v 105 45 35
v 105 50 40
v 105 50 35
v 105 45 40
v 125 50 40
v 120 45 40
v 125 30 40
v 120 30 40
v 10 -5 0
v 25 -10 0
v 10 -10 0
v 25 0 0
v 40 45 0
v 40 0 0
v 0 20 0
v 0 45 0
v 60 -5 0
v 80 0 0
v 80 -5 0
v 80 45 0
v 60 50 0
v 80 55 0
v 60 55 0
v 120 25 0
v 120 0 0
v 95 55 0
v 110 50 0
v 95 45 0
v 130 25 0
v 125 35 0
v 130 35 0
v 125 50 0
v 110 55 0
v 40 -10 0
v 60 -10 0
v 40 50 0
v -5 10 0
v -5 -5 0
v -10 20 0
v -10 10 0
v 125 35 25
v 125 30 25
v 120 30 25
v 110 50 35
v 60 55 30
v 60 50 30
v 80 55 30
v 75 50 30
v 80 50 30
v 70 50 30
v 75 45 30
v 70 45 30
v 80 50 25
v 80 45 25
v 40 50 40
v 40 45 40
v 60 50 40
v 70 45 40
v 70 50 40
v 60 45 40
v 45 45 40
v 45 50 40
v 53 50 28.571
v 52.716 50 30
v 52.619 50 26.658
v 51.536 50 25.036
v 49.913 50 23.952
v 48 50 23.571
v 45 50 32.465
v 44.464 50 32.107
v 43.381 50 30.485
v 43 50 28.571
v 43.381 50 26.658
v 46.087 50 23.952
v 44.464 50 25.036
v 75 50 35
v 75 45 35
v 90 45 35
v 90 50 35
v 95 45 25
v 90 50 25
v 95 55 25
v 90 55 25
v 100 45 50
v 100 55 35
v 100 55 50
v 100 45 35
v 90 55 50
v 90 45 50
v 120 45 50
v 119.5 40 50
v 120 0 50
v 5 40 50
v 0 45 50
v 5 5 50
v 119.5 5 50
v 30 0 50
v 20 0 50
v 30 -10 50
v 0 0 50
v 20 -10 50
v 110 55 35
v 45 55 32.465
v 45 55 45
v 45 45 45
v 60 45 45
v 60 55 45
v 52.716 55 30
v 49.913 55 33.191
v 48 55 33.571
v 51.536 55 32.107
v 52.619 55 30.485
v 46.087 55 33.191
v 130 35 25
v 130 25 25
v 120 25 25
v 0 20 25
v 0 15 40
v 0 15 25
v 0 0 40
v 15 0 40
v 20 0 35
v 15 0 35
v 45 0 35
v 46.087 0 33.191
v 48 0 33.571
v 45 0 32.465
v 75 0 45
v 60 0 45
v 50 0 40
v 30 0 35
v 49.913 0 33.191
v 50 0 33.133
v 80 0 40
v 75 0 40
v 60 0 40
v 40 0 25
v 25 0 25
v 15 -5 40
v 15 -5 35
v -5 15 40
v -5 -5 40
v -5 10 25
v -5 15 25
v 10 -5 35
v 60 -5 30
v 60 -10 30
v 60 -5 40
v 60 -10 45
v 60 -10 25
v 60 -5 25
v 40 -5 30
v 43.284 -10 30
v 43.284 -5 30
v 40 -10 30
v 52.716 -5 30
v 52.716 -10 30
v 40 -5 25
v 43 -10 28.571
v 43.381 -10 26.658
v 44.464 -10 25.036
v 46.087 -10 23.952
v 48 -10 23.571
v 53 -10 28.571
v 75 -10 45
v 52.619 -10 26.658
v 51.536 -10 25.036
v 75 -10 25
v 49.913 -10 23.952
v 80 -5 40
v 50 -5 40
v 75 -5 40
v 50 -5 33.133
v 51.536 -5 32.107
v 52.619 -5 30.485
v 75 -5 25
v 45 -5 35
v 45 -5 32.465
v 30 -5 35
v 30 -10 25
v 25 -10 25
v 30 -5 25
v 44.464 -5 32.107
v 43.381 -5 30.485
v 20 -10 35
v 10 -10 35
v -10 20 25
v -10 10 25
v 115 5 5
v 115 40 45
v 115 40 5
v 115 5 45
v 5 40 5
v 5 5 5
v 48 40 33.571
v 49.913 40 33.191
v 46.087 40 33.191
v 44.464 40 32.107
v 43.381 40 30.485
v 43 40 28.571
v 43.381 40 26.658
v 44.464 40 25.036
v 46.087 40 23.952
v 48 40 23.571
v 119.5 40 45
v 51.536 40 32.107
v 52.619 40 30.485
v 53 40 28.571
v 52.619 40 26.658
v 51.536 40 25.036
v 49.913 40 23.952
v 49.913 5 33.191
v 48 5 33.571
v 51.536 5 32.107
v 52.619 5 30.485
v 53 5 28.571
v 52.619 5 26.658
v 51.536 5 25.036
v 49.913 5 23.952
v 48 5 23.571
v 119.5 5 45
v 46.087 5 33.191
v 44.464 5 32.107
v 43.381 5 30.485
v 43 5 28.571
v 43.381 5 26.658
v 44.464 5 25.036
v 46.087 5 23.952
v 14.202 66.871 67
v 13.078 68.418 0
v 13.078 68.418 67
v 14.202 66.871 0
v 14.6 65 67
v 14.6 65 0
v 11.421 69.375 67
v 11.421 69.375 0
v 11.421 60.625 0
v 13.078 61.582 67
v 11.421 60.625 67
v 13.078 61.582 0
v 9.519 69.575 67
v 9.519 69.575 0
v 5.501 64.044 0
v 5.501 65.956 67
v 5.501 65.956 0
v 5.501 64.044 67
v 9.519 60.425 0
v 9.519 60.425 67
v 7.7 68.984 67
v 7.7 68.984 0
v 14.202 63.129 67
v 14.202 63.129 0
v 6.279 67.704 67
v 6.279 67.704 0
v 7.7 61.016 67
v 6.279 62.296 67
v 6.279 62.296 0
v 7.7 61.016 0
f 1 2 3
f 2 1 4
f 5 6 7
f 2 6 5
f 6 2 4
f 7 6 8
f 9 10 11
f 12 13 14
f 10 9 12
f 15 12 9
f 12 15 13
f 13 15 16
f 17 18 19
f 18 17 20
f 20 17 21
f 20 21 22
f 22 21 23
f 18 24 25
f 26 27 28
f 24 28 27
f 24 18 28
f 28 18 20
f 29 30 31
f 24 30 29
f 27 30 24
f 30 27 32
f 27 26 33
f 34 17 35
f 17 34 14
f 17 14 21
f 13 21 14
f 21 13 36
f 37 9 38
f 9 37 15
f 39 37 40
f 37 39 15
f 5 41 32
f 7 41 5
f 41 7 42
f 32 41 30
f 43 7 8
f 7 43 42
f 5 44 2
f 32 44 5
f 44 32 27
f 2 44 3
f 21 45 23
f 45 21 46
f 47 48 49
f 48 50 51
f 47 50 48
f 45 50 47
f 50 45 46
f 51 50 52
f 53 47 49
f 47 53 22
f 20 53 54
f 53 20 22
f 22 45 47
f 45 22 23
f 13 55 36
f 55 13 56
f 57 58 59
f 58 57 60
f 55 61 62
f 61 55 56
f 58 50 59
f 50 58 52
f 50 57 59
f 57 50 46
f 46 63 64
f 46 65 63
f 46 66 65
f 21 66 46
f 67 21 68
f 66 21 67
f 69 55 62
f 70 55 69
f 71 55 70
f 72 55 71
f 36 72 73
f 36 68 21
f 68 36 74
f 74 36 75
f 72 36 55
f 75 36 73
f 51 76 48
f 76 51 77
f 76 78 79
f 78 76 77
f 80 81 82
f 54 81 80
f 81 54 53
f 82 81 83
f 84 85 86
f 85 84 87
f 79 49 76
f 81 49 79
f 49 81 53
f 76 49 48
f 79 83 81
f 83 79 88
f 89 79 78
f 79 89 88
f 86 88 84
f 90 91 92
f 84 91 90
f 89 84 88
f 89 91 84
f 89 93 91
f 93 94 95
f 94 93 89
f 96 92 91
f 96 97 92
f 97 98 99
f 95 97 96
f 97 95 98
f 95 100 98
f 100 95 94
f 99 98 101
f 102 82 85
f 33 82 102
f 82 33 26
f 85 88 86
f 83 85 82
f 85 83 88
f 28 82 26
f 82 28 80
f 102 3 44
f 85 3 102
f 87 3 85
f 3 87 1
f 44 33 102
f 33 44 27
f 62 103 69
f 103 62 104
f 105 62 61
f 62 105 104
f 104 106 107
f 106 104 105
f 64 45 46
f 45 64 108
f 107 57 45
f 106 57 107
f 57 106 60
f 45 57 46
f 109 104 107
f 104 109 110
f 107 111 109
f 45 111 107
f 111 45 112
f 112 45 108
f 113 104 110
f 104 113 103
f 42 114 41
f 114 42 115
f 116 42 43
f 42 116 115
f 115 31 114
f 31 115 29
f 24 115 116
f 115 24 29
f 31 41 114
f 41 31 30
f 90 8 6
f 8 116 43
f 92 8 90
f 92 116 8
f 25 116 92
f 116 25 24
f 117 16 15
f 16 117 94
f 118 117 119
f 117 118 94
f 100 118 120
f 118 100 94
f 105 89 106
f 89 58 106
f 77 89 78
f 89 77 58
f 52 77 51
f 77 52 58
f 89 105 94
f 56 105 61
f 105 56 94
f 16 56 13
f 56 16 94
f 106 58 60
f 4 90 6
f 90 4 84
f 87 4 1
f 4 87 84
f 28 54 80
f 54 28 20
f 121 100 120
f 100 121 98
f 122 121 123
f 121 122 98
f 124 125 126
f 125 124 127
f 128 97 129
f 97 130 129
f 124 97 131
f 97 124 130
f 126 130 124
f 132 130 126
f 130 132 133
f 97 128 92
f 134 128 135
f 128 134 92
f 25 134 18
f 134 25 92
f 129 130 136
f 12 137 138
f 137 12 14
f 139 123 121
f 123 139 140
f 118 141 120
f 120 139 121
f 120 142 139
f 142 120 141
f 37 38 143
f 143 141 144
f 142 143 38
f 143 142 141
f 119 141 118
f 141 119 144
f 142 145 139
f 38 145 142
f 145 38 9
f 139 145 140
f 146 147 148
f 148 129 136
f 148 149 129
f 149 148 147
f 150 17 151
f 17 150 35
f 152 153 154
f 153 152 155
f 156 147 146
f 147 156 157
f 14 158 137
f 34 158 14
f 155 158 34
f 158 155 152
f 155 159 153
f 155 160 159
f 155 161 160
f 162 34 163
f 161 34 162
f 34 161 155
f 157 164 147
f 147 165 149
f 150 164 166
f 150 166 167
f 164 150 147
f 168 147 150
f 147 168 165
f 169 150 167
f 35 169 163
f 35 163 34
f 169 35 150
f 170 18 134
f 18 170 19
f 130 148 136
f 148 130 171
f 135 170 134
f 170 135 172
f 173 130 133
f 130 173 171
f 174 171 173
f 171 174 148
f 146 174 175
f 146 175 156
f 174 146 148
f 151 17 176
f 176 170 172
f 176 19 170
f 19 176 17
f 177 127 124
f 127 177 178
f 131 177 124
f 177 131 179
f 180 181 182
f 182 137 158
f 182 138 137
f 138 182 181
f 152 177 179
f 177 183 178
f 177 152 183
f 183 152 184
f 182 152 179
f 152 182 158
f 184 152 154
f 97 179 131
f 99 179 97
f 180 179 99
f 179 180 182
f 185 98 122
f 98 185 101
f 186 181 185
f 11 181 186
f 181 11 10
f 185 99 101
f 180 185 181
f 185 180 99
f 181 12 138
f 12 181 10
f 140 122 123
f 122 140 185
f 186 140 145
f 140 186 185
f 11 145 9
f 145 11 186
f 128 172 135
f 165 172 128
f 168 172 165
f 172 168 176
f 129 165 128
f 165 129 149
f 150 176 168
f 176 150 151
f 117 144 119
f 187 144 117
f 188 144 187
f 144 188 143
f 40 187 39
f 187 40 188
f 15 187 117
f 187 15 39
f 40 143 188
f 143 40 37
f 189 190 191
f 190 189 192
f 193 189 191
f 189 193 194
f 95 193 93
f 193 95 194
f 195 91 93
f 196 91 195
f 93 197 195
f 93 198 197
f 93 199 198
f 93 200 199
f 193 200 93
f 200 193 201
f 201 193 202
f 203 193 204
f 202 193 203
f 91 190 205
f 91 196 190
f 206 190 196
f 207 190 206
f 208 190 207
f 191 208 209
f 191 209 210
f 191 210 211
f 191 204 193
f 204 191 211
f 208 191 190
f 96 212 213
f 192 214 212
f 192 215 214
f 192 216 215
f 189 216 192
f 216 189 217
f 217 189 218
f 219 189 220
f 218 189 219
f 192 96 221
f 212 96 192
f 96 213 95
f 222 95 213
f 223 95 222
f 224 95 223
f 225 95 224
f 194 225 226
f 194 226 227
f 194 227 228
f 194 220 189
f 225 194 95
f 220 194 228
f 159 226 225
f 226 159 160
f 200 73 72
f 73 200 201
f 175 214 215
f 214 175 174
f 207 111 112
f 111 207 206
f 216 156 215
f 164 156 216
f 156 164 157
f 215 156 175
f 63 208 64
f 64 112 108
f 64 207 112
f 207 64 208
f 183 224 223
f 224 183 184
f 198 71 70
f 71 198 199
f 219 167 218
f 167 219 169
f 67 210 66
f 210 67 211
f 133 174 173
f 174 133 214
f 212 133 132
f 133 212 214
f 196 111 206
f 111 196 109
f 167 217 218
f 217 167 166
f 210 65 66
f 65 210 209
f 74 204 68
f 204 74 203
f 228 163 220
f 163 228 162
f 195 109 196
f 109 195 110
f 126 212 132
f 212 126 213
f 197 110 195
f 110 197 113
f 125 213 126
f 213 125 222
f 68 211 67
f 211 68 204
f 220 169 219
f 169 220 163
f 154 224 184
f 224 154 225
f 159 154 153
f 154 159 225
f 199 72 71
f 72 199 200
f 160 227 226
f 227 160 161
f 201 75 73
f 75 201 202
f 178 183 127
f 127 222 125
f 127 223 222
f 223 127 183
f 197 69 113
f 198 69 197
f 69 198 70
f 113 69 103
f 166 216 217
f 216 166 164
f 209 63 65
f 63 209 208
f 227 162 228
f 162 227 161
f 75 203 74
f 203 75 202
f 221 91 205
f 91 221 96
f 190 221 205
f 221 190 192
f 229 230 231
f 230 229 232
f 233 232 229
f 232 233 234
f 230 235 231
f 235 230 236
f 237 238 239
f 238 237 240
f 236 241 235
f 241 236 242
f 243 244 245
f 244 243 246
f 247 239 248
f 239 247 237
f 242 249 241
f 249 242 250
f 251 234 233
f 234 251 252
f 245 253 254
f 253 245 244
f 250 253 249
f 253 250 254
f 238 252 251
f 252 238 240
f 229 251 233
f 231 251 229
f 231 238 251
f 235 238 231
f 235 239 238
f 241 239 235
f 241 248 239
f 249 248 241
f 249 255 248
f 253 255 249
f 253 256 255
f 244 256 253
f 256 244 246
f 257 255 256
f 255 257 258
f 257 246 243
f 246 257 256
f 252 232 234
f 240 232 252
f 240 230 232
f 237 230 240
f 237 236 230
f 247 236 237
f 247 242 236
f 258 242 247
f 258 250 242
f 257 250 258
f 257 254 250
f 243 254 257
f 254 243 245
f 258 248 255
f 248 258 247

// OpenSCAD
//Customizable Tape Dispenser

//Main Box Width
BaseWidth = 45;

//Main Box Length
BaseLength = 120;

//Main Box Height
BaseHeight = 50;

//Outside Large Box (How far it goes out)
OutsideLLength = 10;

//Outside Small Box (How far it goes out)
OutsideSLength = 5;

BottomThickness = 5;

//Main Hole Width
MHoleWidth = 35;

//Main Hole Length
MHoleLength = 110;

//Radius of Pole
RPole = 5;


difference(){
    //Base Cube
    union(){
        cube([BaseLength,BaseWidth,BaseHeight]);
        translate([-BaseLength/24,-OutsideSLength,0]){
            cube([20,20,40]);
        }
        translate([BaseLength/3,-OutsideLLength,0]){
            cube([20,20,30]);
        }
        translate([5*BaseLength/12,-OutsideSLength,0]){
            cube([30,20,40]);
        }
        translate([BaseLength/6,-OutsideSLength,BaseHeight/2]){
            cube([25,20,10]);
        }
        translate([BaseLength/6,-OutsideLLength,BaseHeight/2]){
            cube([10,20,25]);
        }
        translate([BaseLength/12,-OutsideLLength,0]){
            cube([15,20,35]);
        }
        translate([BaseLength/2,-OutsideLLength,BaseHeight/2]){
            cube([15,20,20]);
        }
        translate([-OutsideLLength,2*BaseWidth/9,0]){
            cube([15,10,25]);
        }
        rotate([0,0,180]){
            translate([-BaseLength,-BaseWidth, 0]){
                translate([-BaseLength/24,-OutsideSLength,0]){
                    cube([20,20,40]);
                }
                translate([BaseLength/3,-OutsideLLength,0]){
                    cube([20,20,30]);
                }
                translate([5*BaseLength/12,-OutsideSLength,0]){
                    cube([30,20,40]);
                }
                translate([BaseLength/6,-OutsideSLength,25]){
                    cube([25,20,10]);
                }
                translate([BaseLength/6,-OutsideLLength,25]){
                    cube([10,20,25]);
                }
                translate([BaseLength/12,-OutsideLLength,0]){
                    cube([15,20,35]);
                }
                translate([BaseLength/2,-OutsideLLength,30]){
                    cube([15,20,15]);
                }
                translate([-OutsideLLength,2*BaseWidth/9,0]){
                    cube([15,10,25]);
                }
            }
        }
    }
    //Main Hole
    translate([(BaseLength-MHoleLength)/2, (BaseWidth-MHoleWidth)/2,BottomThickness]){
        cube([MHoleLength,MHoleWidth,BaseHeight]);
    }
    //Pole
    translate([BaseLength/2.5, BaseWidth+OutsideLLength+100,BaseHeight/1.75]){
        rotate([90,0,0]){
        cylinder(BaseWidth+(OutsideLLength*2)+200,RPole,RPole);
        }
    }
    //Cutter
    translate([(BaseLength-MHoleLength)-0.5, (BaseWidth-MHoleWidth)/2,BaseHeight-5]){
        cube([MHoleLength,MHoleWidth,BaseHeight]);
    }
}
//Pole
translate([10, BaseWidth+OutsideLLength+10,0]){
    cylinder(BaseWidth+(OutsideLLength*2)+2,RPole-0.4,RPole-0.4);
}
